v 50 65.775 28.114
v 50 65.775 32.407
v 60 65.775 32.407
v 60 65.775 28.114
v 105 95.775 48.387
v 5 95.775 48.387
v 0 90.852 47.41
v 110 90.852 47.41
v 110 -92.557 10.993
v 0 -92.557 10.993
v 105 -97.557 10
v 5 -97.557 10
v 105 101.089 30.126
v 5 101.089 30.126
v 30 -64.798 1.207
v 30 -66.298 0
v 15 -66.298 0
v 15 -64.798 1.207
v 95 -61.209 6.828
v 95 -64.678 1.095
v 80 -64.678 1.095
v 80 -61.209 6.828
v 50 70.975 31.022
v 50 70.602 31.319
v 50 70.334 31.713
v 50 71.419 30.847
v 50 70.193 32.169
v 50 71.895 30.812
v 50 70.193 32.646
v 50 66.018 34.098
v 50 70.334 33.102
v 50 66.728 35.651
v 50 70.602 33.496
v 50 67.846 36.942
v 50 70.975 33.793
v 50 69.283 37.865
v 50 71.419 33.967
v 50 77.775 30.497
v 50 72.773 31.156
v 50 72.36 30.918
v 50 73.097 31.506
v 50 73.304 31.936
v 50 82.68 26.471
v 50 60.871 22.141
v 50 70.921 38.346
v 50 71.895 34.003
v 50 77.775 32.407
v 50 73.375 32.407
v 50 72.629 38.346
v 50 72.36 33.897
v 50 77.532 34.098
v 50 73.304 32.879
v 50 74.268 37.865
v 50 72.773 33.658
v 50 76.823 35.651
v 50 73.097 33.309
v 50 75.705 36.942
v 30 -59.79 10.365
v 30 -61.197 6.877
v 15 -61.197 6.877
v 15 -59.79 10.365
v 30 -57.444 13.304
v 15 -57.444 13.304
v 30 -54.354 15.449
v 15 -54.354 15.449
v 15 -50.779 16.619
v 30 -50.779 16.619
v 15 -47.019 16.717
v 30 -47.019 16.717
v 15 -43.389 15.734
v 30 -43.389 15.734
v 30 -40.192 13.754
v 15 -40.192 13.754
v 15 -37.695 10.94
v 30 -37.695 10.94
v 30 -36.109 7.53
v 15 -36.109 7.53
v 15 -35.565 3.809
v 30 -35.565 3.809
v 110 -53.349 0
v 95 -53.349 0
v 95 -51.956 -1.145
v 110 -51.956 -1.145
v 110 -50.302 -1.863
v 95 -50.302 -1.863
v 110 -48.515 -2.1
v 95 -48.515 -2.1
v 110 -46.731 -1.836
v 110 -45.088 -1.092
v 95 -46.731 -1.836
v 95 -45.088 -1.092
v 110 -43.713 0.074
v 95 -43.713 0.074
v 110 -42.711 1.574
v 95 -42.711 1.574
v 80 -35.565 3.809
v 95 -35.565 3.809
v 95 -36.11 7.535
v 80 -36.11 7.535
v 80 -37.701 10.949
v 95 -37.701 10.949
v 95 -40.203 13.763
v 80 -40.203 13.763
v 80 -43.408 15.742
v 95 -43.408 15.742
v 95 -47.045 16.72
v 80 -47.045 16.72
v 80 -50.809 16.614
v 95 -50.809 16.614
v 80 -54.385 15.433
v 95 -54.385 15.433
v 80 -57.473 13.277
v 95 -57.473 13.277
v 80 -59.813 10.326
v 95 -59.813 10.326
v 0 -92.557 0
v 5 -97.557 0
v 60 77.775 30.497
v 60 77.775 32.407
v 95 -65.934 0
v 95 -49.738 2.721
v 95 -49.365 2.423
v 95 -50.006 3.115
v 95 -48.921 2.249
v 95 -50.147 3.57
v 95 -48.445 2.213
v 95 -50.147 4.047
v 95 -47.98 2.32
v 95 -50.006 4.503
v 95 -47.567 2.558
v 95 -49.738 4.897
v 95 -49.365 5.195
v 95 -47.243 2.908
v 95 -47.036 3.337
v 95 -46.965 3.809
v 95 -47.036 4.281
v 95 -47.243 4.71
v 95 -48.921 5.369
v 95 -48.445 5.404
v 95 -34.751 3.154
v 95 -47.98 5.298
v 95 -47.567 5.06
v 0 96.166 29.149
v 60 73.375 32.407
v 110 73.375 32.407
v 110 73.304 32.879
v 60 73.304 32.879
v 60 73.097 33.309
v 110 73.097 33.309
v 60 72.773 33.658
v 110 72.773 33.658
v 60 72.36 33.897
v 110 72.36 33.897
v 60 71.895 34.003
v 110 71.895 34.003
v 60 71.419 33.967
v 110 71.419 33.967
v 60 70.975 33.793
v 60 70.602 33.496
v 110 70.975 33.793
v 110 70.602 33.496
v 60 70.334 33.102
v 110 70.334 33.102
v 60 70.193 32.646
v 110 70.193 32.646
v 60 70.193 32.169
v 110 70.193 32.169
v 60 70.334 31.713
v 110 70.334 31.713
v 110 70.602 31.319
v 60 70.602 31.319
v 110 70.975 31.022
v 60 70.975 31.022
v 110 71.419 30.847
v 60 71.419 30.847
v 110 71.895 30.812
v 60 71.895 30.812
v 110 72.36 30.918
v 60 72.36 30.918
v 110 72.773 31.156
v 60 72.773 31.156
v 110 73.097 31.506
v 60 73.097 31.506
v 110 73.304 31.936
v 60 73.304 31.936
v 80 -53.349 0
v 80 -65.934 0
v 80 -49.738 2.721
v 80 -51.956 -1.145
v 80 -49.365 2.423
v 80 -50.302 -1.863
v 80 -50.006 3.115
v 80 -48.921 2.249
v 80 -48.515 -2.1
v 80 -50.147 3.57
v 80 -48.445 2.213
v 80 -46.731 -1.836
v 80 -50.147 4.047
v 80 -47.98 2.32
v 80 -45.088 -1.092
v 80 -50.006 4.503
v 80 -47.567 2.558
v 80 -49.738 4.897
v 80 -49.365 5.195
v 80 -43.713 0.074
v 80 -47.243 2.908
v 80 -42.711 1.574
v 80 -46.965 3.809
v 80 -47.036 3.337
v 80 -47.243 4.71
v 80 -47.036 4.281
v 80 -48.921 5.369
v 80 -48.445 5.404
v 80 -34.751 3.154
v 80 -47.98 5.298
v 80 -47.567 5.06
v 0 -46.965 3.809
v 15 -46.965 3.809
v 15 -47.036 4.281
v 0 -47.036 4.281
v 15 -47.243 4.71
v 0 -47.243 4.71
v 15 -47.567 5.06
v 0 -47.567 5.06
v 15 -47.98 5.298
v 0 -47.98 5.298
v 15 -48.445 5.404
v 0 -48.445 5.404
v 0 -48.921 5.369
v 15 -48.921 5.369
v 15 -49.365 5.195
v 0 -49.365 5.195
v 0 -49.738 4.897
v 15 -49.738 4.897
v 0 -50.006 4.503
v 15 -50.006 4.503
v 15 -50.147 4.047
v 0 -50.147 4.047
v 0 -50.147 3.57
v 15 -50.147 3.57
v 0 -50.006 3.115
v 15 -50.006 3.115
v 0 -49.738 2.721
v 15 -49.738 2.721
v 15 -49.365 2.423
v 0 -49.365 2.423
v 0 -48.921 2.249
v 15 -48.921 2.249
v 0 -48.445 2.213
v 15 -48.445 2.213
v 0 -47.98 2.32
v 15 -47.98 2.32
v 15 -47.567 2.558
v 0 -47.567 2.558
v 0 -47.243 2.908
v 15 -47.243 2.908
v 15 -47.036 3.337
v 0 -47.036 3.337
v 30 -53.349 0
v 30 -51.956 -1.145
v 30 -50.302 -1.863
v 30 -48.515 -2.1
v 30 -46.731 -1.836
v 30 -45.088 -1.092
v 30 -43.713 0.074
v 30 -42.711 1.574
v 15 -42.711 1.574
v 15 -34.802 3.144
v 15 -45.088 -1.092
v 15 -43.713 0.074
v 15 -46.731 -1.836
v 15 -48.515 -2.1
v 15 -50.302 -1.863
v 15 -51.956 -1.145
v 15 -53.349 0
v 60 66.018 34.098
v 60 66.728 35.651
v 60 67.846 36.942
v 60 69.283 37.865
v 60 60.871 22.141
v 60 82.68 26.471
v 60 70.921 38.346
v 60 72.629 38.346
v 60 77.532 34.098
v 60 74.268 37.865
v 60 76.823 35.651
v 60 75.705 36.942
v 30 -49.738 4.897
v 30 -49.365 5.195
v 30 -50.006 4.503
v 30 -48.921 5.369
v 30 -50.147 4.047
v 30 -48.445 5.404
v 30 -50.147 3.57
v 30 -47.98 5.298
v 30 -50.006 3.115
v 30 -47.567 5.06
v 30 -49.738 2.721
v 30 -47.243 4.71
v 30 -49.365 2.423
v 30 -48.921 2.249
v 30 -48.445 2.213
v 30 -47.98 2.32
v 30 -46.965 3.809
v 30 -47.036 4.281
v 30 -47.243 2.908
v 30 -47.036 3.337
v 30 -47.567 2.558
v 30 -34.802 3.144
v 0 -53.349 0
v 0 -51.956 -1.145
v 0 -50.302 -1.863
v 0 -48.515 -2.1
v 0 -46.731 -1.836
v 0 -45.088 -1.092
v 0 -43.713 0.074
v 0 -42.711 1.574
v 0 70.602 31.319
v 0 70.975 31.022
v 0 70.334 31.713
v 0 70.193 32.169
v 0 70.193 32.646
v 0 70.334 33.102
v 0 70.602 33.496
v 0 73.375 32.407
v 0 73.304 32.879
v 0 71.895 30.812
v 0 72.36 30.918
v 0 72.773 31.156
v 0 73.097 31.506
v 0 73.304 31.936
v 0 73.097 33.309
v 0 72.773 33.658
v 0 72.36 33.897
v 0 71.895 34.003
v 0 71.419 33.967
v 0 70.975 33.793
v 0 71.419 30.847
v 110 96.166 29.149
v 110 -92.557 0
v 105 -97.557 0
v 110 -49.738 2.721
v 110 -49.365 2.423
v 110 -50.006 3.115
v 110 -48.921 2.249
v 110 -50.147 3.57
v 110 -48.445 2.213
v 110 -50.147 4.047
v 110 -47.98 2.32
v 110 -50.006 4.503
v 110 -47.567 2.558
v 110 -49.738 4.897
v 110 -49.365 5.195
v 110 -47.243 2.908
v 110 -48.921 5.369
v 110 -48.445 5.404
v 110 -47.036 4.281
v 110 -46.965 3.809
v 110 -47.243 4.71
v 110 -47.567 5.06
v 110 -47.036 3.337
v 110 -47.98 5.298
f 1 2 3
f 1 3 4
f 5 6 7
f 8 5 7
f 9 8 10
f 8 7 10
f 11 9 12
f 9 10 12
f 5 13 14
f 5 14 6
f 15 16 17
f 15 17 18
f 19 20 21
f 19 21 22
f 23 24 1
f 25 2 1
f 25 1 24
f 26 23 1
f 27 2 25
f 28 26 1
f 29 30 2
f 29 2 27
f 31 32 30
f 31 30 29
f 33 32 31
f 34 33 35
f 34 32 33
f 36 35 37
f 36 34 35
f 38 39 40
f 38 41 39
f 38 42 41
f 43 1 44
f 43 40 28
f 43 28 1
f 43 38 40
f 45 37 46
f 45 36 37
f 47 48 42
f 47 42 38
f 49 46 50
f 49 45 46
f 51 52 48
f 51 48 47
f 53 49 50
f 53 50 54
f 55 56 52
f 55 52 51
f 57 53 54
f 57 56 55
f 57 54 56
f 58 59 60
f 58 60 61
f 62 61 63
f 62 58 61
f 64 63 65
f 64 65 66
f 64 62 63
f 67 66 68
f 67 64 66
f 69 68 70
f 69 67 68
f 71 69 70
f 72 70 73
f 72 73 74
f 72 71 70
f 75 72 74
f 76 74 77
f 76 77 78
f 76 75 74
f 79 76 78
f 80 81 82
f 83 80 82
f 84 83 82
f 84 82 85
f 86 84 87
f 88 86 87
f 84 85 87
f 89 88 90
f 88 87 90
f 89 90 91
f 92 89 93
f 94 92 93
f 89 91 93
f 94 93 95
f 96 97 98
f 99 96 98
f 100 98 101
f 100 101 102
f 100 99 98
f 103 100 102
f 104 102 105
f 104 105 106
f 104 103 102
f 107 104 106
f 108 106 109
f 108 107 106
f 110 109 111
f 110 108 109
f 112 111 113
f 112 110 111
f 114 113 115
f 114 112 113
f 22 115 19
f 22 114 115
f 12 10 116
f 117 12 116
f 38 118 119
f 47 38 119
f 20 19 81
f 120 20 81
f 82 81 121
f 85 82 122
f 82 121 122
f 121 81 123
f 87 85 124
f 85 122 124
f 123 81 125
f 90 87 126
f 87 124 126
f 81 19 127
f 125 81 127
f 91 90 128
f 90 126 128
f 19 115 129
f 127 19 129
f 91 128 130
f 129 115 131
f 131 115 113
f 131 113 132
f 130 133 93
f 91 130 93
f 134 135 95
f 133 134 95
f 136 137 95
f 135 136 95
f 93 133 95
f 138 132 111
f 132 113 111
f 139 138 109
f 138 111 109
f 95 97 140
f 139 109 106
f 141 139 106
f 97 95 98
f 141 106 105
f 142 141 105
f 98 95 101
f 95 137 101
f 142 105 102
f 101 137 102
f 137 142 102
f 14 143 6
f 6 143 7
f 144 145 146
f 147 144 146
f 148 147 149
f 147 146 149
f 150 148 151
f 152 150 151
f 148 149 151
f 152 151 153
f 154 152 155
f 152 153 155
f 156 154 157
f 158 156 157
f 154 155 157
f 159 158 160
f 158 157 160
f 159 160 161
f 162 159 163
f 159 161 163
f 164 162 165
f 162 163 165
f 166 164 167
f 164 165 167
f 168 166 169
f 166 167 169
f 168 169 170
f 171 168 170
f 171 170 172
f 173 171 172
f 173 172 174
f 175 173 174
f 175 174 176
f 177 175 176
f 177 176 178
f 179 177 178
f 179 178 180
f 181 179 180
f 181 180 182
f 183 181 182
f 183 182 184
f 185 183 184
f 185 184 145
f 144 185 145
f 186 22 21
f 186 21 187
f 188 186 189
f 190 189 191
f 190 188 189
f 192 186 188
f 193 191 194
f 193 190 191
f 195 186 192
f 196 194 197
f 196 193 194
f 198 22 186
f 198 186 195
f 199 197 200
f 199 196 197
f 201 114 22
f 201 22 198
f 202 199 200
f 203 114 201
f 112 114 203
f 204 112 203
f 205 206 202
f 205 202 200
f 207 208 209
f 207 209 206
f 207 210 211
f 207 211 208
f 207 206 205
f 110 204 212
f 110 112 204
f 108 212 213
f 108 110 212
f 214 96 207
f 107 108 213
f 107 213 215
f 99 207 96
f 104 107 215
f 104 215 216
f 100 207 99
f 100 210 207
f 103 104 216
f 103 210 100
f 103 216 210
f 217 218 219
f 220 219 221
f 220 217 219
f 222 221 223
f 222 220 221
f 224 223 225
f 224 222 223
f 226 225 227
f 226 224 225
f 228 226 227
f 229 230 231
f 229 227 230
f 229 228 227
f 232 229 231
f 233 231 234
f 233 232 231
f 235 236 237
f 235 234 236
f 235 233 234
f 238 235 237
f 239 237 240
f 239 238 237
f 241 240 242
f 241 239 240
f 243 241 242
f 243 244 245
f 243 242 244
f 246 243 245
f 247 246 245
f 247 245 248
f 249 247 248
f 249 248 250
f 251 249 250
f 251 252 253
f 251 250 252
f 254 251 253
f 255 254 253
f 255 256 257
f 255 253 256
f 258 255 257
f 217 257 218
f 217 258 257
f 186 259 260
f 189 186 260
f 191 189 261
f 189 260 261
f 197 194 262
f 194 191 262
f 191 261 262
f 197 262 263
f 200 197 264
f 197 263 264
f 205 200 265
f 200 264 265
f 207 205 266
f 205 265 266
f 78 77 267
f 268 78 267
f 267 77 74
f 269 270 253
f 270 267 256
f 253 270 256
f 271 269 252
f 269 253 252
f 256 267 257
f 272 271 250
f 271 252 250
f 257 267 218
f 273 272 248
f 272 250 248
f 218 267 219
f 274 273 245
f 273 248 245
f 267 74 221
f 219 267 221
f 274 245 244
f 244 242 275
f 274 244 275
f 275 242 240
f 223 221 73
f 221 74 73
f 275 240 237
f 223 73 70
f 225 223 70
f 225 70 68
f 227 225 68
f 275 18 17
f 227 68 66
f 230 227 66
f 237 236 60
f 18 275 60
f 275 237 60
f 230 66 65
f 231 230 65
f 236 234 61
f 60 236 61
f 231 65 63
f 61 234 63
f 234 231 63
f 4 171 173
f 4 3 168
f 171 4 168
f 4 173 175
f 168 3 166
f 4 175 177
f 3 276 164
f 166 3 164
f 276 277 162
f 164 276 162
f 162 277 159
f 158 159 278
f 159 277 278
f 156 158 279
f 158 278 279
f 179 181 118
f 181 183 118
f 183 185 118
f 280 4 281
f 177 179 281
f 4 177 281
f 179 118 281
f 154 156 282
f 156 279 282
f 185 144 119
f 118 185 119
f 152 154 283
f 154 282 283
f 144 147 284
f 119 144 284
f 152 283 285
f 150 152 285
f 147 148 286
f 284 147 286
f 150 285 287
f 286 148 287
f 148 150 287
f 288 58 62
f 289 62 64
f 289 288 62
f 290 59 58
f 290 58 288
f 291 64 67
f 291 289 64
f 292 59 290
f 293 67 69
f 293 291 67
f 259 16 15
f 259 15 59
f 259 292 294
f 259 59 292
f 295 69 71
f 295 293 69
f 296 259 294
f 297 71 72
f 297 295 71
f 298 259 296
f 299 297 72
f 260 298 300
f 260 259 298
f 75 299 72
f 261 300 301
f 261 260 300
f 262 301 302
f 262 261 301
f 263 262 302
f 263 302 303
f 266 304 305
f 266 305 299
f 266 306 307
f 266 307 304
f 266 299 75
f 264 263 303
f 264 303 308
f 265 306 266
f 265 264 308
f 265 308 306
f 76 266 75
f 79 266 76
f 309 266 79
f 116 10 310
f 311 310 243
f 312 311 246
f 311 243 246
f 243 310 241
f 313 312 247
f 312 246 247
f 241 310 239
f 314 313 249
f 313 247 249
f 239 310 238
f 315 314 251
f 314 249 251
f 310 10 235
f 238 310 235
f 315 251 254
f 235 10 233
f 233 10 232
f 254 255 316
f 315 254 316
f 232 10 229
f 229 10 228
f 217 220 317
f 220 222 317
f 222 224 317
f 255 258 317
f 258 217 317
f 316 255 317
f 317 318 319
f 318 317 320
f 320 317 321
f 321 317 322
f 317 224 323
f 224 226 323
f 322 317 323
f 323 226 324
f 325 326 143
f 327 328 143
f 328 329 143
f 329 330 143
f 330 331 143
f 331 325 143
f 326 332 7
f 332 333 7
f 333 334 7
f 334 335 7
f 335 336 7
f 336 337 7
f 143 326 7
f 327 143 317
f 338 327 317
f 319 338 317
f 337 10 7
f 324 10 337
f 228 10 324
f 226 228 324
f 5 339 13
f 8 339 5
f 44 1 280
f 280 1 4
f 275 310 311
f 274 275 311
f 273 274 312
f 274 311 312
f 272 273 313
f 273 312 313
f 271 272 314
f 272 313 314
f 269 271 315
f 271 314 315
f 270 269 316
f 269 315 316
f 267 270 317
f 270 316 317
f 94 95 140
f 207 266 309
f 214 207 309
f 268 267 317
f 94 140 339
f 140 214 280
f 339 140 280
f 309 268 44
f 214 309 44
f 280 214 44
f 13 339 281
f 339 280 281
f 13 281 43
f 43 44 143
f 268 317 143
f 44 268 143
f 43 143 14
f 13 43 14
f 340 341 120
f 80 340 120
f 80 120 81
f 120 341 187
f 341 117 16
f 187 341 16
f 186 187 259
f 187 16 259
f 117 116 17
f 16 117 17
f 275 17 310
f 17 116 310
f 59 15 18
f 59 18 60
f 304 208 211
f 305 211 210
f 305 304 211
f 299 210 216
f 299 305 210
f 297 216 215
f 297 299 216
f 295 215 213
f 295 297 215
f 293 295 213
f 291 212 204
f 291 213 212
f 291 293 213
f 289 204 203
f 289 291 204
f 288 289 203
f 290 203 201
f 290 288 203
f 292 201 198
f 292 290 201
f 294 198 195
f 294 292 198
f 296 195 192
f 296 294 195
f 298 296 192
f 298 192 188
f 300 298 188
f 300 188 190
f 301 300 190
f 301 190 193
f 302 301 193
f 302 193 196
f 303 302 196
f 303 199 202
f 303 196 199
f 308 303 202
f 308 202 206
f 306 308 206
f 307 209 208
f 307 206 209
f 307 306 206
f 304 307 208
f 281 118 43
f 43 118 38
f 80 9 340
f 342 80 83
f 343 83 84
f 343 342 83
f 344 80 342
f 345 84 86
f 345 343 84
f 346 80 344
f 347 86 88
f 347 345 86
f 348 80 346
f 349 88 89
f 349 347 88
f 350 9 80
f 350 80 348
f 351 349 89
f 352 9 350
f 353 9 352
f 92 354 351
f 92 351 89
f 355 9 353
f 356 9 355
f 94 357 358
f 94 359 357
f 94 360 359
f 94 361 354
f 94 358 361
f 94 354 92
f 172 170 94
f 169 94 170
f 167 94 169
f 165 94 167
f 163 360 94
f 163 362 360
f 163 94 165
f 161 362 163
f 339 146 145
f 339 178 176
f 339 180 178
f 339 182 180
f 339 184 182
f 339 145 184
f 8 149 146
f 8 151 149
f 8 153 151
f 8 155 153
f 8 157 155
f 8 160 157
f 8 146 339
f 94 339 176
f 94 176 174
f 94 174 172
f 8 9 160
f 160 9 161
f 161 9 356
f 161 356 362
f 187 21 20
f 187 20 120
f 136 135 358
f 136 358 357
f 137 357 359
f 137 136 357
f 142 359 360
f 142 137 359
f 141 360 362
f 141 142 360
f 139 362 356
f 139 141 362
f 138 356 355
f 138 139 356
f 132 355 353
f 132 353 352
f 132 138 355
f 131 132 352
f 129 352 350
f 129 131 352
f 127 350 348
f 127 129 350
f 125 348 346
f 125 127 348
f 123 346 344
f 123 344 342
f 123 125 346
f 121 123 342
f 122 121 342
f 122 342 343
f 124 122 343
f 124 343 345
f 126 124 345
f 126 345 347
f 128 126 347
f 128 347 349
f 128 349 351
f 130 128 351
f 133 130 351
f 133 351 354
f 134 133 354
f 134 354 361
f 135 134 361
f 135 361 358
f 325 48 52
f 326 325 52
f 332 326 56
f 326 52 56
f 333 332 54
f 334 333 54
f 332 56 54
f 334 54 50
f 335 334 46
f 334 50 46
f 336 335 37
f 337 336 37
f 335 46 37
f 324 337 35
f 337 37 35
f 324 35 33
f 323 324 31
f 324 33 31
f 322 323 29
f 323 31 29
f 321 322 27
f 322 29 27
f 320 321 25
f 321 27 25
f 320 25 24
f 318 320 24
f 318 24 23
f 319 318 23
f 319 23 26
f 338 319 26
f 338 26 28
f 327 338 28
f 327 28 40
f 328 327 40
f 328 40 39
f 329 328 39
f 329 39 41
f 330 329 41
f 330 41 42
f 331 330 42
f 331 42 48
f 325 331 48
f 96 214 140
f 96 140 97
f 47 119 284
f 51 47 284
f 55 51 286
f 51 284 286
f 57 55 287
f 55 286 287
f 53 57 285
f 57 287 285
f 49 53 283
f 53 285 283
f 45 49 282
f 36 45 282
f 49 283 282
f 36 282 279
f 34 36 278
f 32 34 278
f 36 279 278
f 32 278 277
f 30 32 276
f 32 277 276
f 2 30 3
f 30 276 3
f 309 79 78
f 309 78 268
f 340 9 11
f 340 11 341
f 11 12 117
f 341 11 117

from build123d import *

# Parameters (mm, degrees)
F1_R         = 1.6
F2_DEPTH     = 110
F3_W         = 15
F3_H         = 15
F4_DEPTH     = 10.5
F5_R         = 1.6
F6_DEPTH     = 15
F7_T1_DEPTH  = 15
F9_DEPTH     = 5
F10_R        = 1.6
F11_DEPTH    = 110.001
F12_SIZE     = 5
F13_SIZE     = 5
F14_SIZE     = 5
F15_R        = 1.6
F16_DEPTH    = 15
F17_T1_DEPTH = 15


# Not quite as in the source:
# - a fillet or chamfer that OpenCascade refuses, or shapes differently, is made with other operations: its cross-section is extruded or revolved along the edge and cut away or added
# - an extrude ends at something that could not be found from the text; its depth is read off the source's solid


with BuildPart() as f2:
    # F1 (on Right) → F2 (new body)
    with BuildSketch(Plane.YZ):
        with BuildLine():
            Line((-97.5568636432, 0), (-53.34897794, 0))
            ThreePointArc((-53.34897794, 0), (-47.6134207396, -2.0300236301), (-42.7112703662, 1.5736597709))
            Line((-42.7112703662, 1.5736597709), (101.0891949998, 30.1261963412))
            Line((101.0891949998, 30.1261963412), (95.775378419, 48.3873994959))
            Line((95.775378419, 48.3873994959), (-97.5568636432, 10))
            Line((-97.5568636432, 10), (-97.5568636432, 0))
        make_face()
        with Locations((-48.5646284544, 3.8089532984)):
            Circle(F1_R, mode=Mode.SUBTRACT)
    extrude(amount=F2_DEPTH)

    # F3 (on Top) → F4 (cut, symmetric)
    with BuildSketch(Plane.XY):
        with Locations((22.5, -48.34897794)):
            Rectangle(F3_W, F3_H)
        with Locations((87.5, -47.7112703662)):
            Rectangle(F3_W, F3_H)
    extrude(amount=F4_DEPTH, both=True, mode=Mode.SUBTRACT)

    # F5 (on face) → F6 (cut, through all)
    with BuildSketch(Plane.YZ.offset(80)):
        with BuildLine():
            Line((-28.9665386081, -1.5009464696), (-35.5646284544, 3.8089532984))
            ThreePointArc((-35.5646284544, 3.8089532984), (-48.5646284544, 16.8089532984), (-61.5646284544, 3.8089532984))
            Line((-61.5646284544, 3.8089532984), (-67.6559507847, -1.5009464696))
            Line((-67.6559507847, -1.5009464696), (-44.5721596479, -13.8469105586))
            Line((-44.5721596479, -13.8469105586), (-28.9665386081, -1.5009464696))
        make_face()
        with Locations((-48.5646284544, 3.8089532984)):
            Circle(F5_R, mode=Mode.SUBTRACT)
    extrude(amount=F6_DEPTH, mode=Mode.SUBTRACT)

    # F7: chamfer of 5 on 1 edges, made by hand

    # F7_s2 → F7_t1 (cut)
    with BuildSketch(Plane.YZ.offset(80)):
        with BuildLine():
            Line((-64.7812034248, 0.9241461465), (-61.1056580828, 6.9991937656))
            Line((-61.1056580828, 6.9991937656), (-61.0083922357, 6.9759697482))
            ThreePointArc((-61.0083922357, 6.9759697482), (-61.3651603236, 5.4078228571), (-61.4646284544, 3.8089532984))
            Line((-61.4646284544, 3.8089532984), (-61.4989183361, 3.7335730599))
            ThreePointArc((-61.4989183361, 3.7335730599), (-63.1272340331, 2.3141451142), (-64.7154933066, 0.848765908))
            Line((-64.7154933066, 0.848765908), (-64.7812034248, 0.9241461465))
        make_face()
    extrude(amount=F7_T1_DEPTH, mode=Mode.SUBTRACT)

    # F8 (on offset) → F9 (cut, symmetric)
    with BuildSketch(Plane.YZ.offset(55)):
        with BuildLine():
            Line((77.775378419, 22.0739301294), (77.775378419, 32.4073002482))
            ThreePointArc((77.775378419, 32.4073002482), (71.775378419, 38.4073002482), (65.775378419, 32.4073002482))
            Line((65.775378419, 32.4073002482), (65.775378419, 22.0739301294))
            Line((65.775378419, 22.0739301294), (77.775378419, 22.0739301294))
        make_face()
    extrude(amount=F9_DEPTH, both=True, mode=Mode.SUBTRACT)

    # F10 (on face) → F11 (cut, through all)
    with BuildSketch(Plane.YZ.offset(110)):
        with Locations((71.775378419, 32.4073002482)):
            Circle(F10_R)
    extrude(amount=-F11_DEPTH, mode=Mode.SUBTRACT)

    # F12
    f12_edges = [f2.edges().sort_by_distance(p)[0] for p in [
        (55, 77.775378, 25.497083),
    ]]
    chamfer(f12_edges, length=F12_SIZE)

    # F13
    f13_edges = [f2.edges().sort_by_distance(p)[0] for p in [
        (55, 65.775378, 23.114404),
    ]]
    chamfer(f13_edges, length=F13_SIZE)

    # F14
    f14_edges = [f2.edges().sort_by_distance(p)[0] for p in [
        (0, 98.432287, 39.256798),
        (110, 98.432287, 39.256798),
        (110, -97.556864, 5),
        (0, -97.556864, 5),
    ]]
    chamfer(f14_edges, length=F14_SIZE)

    # F15 (on face) → F16 (cut, through all)
    with BuildSketch(Plane(origin=(30, 0, 0), x_dir=(0, -1, 0), z_dir=(-1, 0, 0))):
        with BuildLine():
            Line((68.1627183007, -1.5009464696), (61.5646284544, 3.8089532984))
            ThreePointArc((61.5646284544, 3.8089532984), (48.5646284544, 16.8089532984), (35.5646284544, 3.8089532984))
            Line((35.5646284544, 3.8089532984), (29.4733061241, -1.5009464696))
            Line((29.4733061241, -1.5009464696), (52.5570972608, -13.8469105586))
            Line((52.5570972608, -13.8469105586), (68.1627183007, -1.5009464696))
        make_face()
        with Locations((48.5646284544, 3.8089532984)):
            Circle(F15_R, mode=Mode.SUBTRACT)
    extrude(amount=F16_DEPTH, mode=Mode.SUBTRACT)

    # F17: chamfer of 5 on 1 edges, made by hand

    # F17_s2 → F17_t1 (cut)
    with BuildSketch(Plane.YZ.offset(15)):
        with BuildLine():
            Line((-64.9047662945, 1.0383670147), (-61.0901119265, 7.0462123799))
            Line((-61.0901119265, 7.0462123799), (-60.9929374028, 7.0226091613))
            ThreePointArc((-60.9929374028, 7.0226091613), (-61.3621185428, 5.4319897848), (-61.4646284544, 3.8089532984))
            Line((-61.4646284544, 3.8089532984), (-61.5019329447, 3.731047759))
            ThreePointArc((-61.5019329447, 3.731047759), (-63.1921659154, 2.3708104982), (-64.8420707848, 0.9604614753))
            Line((-64.8420707848, 0.9604614753), (-64.9047662945, 1.0383670147))
        make_face()
    extrude(amount=F17_T1_DEPTH, mode=Mode.SUBTRACT)


solid = f2.part
